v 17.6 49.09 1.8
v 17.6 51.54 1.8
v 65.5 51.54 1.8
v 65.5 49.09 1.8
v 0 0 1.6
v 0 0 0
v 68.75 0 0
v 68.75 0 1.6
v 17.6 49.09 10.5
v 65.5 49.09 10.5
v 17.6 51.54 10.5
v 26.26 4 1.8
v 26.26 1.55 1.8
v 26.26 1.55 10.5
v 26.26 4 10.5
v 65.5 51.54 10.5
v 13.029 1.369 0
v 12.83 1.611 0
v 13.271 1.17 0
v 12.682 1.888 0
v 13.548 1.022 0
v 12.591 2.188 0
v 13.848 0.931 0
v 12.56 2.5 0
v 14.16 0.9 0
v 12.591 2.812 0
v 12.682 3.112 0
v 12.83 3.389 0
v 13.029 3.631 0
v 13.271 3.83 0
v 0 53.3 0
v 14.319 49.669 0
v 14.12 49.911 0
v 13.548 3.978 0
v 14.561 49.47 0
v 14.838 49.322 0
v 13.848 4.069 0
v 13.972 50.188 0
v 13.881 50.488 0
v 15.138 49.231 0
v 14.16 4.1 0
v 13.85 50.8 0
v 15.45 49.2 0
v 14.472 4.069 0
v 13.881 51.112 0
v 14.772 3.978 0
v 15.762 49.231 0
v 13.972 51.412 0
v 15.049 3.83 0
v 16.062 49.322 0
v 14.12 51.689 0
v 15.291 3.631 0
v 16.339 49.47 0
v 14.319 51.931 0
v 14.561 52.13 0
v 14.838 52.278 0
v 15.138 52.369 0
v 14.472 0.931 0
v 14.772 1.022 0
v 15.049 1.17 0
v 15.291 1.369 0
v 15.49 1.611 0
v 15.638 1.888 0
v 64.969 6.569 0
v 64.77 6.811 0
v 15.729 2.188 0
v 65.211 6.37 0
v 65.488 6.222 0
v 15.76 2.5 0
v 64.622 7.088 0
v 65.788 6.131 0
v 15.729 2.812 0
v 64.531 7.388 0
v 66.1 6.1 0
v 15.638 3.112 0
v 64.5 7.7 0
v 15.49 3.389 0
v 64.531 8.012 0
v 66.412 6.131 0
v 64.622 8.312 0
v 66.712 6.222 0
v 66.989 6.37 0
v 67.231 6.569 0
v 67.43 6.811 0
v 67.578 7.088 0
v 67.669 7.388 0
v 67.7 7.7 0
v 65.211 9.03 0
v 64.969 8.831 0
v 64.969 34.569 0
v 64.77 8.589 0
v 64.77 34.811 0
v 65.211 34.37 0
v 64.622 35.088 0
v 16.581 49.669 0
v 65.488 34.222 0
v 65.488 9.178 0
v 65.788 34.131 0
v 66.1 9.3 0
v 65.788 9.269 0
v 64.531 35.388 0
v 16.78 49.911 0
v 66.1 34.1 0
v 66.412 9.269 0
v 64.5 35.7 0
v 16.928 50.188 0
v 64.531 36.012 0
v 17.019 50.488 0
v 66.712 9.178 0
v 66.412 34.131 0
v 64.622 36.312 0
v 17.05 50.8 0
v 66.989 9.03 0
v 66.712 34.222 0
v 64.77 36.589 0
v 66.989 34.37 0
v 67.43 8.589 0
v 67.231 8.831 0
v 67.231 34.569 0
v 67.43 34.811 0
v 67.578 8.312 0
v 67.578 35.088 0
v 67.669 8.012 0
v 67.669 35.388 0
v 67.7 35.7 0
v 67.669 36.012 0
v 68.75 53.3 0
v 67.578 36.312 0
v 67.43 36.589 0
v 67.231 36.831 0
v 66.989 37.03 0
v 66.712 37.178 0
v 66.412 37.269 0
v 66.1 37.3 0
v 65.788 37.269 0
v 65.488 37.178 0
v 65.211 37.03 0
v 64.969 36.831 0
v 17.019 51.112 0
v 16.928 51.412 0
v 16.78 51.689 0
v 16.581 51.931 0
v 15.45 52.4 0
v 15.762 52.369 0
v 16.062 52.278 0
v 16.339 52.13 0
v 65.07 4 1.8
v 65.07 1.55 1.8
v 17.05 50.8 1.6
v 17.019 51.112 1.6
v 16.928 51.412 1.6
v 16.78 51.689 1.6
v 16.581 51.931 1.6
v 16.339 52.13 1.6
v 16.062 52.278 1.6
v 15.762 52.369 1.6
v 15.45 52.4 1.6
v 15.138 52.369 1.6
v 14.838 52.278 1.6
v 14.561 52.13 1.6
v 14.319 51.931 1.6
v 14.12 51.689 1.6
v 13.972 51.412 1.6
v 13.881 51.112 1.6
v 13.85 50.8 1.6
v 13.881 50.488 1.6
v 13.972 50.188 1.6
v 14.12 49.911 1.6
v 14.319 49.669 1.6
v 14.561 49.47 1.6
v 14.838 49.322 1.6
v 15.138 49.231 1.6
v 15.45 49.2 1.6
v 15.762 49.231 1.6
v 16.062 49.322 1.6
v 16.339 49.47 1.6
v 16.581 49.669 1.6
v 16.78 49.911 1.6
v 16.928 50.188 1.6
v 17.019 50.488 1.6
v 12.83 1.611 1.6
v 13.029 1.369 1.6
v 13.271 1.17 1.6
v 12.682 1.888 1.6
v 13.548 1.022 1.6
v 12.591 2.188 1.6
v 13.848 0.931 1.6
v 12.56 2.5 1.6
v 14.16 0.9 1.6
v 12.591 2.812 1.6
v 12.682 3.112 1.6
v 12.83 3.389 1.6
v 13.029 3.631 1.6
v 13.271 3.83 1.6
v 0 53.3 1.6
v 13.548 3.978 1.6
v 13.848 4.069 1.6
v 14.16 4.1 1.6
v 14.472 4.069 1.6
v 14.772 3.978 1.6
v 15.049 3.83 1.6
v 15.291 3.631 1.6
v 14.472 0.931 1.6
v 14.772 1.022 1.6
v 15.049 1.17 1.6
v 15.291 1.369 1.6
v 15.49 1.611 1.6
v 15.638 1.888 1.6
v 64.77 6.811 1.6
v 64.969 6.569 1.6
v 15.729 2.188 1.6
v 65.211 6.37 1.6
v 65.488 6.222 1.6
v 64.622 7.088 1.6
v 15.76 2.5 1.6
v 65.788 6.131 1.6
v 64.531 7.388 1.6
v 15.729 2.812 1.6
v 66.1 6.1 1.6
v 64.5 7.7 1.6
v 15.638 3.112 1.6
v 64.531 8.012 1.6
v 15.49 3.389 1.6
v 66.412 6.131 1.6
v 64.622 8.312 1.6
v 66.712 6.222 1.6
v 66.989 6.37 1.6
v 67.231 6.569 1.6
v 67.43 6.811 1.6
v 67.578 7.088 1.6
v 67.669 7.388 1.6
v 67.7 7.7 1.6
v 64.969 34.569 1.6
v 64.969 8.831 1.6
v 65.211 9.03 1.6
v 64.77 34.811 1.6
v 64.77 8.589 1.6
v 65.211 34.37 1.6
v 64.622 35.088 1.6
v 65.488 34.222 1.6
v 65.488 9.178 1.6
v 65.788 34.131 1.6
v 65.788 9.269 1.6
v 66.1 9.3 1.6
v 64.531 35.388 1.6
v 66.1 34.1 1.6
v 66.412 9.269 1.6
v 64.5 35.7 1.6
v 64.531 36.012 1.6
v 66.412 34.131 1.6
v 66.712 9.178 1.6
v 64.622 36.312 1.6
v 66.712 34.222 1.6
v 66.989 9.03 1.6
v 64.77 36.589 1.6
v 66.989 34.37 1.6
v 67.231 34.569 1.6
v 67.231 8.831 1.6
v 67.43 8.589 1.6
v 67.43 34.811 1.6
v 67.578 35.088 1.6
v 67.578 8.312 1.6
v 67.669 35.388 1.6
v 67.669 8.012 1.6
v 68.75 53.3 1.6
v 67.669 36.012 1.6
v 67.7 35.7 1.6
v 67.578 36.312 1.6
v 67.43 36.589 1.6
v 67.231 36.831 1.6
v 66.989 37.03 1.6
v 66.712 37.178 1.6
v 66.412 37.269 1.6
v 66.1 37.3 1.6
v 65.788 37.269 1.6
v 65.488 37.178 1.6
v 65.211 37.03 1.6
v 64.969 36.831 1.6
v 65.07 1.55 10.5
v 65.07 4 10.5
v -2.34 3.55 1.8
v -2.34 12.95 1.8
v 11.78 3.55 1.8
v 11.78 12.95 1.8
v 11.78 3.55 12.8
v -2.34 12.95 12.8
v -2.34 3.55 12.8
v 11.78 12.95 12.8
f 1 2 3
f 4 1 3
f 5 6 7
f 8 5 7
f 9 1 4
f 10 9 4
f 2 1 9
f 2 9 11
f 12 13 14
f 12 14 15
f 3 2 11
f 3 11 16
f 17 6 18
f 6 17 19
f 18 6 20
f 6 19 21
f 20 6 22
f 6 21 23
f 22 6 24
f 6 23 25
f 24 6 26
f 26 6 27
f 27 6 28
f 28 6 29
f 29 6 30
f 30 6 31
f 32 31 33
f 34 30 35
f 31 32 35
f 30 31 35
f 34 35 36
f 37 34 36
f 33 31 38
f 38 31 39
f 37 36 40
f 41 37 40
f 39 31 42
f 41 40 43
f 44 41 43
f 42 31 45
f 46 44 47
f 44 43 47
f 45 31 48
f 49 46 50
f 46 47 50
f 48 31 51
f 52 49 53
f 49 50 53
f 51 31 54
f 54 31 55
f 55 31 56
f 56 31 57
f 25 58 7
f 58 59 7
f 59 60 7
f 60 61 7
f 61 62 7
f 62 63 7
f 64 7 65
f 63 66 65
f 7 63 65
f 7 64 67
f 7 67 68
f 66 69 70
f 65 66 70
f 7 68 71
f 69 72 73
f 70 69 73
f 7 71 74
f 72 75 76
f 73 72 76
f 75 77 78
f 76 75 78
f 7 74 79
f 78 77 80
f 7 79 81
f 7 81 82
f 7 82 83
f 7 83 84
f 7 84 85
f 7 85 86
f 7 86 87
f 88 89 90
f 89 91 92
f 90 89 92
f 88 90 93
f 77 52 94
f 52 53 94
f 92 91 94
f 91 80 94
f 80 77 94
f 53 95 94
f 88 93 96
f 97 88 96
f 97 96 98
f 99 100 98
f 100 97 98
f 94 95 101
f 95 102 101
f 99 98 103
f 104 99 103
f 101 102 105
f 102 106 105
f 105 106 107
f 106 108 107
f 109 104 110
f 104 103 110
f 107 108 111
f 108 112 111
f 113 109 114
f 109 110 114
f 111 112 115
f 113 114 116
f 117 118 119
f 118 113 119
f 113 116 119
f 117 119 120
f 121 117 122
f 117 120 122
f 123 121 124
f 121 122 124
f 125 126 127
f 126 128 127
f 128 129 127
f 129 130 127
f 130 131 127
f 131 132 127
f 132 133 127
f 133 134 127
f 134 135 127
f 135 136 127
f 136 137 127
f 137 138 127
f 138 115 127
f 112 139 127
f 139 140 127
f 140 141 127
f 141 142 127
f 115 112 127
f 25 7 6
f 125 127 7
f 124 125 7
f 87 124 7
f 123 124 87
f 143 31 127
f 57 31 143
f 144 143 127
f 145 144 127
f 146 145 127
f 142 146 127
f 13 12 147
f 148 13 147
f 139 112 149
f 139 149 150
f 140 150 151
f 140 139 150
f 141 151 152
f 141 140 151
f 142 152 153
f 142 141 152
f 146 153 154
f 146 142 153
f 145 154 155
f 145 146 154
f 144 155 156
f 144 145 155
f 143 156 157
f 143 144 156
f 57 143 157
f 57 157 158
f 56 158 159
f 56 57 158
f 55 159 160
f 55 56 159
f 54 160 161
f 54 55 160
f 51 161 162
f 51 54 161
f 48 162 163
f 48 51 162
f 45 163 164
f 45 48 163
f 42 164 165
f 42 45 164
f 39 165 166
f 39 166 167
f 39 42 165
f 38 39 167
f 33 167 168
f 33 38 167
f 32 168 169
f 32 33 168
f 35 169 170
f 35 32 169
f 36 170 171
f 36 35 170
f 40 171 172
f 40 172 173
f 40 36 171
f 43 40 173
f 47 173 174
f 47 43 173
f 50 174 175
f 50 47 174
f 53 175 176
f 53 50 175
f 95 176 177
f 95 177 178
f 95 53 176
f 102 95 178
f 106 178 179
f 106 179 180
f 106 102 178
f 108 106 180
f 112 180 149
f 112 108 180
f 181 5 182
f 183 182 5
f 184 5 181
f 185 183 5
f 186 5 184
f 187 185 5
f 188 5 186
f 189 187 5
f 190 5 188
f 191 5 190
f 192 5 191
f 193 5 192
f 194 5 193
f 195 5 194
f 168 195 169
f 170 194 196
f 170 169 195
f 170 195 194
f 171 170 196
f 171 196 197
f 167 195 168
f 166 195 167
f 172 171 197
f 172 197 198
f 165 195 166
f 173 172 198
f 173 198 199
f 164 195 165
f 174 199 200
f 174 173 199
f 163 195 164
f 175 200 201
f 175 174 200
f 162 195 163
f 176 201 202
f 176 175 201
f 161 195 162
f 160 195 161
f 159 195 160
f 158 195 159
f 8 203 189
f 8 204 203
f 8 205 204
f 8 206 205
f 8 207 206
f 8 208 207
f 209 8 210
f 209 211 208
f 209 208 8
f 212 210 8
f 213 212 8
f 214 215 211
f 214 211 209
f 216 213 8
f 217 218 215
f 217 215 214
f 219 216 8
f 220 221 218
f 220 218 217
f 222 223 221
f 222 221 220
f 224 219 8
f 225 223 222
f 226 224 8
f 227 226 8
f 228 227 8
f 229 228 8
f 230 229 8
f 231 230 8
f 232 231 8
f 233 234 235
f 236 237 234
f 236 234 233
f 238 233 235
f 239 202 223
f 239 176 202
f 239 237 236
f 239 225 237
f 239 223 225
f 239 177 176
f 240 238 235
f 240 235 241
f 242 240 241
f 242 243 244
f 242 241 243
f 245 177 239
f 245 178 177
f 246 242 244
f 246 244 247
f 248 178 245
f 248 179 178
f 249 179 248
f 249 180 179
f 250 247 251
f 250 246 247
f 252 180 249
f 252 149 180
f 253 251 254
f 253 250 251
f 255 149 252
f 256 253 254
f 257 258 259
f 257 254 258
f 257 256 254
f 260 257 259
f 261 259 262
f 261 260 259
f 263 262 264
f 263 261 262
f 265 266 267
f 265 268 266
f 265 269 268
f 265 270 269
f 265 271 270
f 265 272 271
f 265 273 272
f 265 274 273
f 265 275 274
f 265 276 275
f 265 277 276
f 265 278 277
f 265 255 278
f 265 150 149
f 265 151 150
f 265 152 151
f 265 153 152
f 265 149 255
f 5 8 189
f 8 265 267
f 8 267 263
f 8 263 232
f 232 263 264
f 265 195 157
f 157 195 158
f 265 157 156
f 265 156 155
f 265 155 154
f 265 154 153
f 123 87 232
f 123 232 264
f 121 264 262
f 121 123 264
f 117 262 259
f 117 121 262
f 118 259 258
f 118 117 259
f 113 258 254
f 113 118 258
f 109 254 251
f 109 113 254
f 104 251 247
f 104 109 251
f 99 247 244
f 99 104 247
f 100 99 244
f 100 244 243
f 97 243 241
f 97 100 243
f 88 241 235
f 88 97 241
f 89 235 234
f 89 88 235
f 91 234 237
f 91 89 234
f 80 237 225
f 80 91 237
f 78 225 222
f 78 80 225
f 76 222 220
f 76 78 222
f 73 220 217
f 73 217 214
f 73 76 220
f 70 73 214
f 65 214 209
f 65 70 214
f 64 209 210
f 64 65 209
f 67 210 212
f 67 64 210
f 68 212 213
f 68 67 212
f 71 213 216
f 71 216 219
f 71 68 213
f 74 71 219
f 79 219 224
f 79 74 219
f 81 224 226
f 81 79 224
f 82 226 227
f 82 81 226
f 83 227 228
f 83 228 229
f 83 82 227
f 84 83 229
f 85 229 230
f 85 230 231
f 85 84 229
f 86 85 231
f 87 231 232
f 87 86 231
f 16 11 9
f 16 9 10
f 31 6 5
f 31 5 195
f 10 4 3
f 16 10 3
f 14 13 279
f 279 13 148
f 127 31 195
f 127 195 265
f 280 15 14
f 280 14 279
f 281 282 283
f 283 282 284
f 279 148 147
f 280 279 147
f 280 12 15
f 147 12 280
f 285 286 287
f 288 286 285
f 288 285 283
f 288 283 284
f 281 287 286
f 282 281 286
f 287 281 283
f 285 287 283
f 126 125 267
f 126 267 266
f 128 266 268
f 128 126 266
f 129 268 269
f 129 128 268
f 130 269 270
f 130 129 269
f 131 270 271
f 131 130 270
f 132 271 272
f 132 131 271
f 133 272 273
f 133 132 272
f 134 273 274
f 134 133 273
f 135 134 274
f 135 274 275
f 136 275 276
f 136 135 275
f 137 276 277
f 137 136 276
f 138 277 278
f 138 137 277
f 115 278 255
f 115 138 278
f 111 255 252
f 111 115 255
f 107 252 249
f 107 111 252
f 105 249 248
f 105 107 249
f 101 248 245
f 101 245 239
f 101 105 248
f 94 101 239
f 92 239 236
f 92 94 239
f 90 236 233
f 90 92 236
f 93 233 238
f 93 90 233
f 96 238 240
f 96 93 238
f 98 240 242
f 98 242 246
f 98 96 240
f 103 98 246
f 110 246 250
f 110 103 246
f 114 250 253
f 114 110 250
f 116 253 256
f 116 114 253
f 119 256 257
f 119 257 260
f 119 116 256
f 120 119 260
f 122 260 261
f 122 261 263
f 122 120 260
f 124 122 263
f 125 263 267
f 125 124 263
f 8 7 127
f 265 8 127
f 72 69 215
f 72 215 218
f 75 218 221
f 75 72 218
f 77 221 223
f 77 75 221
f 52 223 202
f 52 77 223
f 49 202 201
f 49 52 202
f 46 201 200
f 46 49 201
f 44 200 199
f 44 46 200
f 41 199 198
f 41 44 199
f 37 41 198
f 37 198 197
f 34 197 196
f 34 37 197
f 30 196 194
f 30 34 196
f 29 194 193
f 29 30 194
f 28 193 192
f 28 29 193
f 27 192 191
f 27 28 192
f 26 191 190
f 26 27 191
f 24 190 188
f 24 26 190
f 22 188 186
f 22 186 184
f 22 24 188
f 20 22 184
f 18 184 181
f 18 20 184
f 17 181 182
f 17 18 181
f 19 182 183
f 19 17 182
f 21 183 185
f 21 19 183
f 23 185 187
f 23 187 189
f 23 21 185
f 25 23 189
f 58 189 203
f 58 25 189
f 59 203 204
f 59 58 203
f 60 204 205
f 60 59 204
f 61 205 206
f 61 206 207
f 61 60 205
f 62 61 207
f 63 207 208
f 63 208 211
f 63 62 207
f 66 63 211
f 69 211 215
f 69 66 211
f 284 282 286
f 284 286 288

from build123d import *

# Parameters (mm, degrees)
F0_W     = 68.75
F0_H     = 53.3
F0_R     = 1.6
F1_DEPTH = 1.6
F3_W     = 14.12
F3_H     = 9.4
F4_DEPTH = 11
F3_W_2   = 47.9
F3_H_2   = 2.45
F5_DEPTH = 8.7
F3_W_3   = 38.81


with BuildPart() as f1:
    # F0 (on Top) → F1 (new body)
    with BuildSketch(Plane.XY):
        with Locations((34.375, 26.65)):
            Rectangle(F0_W, F0_H)
        with Locations((14.16, 2.5)):
            Circle(F0_R, mode=Mode.SUBTRACT)
        with Locations((66.1, 7.7)):
            Circle(F0_R, mode=Mode.SUBTRACT)
        with Locations((15.45, 50.8)):
            Circle(F0_R, mode=Mode.SUBTRACT)
        with Locations((66.1, 35.7)):
            Circle(F0_R, mode=Mode.SUBTRACT)
    extrude(amount=F1_DEPTH)


with BuildPart() as f4:
    # F3 (on offset) → F4 (new body)
    with BuildSketch(Plane.XY.offset(1.8)):
        with Locations((4.72, 8.25)):
            Rectangle(F3_W, F3_H)
    extrude(amount=F4_DEPTH)


with BuildPart() as f5:
    # F3 (on offset) → F5 (new body)
    with BuildSketch(Plane.XY.offset(1.8)):
        with Locations((41.55, 50.315)):
            Rectangle(F3_W_2, F3_H_2)
    extrude(amount=F5_DEPTH)


with BuildPart() as f5b:
    # F3 (on offset) → F5, piece 2 (new body)
    with BuildSketch(Plane.XY.offset(1.8)):
        with Locations((45.665, 2.775)):
            Rectangle(F3_W_3, F3_H_2)
    extrude(amount=F5_DEPTH)


solid = Compound([f1.part, f4.part, f5.part, f5b.part])
